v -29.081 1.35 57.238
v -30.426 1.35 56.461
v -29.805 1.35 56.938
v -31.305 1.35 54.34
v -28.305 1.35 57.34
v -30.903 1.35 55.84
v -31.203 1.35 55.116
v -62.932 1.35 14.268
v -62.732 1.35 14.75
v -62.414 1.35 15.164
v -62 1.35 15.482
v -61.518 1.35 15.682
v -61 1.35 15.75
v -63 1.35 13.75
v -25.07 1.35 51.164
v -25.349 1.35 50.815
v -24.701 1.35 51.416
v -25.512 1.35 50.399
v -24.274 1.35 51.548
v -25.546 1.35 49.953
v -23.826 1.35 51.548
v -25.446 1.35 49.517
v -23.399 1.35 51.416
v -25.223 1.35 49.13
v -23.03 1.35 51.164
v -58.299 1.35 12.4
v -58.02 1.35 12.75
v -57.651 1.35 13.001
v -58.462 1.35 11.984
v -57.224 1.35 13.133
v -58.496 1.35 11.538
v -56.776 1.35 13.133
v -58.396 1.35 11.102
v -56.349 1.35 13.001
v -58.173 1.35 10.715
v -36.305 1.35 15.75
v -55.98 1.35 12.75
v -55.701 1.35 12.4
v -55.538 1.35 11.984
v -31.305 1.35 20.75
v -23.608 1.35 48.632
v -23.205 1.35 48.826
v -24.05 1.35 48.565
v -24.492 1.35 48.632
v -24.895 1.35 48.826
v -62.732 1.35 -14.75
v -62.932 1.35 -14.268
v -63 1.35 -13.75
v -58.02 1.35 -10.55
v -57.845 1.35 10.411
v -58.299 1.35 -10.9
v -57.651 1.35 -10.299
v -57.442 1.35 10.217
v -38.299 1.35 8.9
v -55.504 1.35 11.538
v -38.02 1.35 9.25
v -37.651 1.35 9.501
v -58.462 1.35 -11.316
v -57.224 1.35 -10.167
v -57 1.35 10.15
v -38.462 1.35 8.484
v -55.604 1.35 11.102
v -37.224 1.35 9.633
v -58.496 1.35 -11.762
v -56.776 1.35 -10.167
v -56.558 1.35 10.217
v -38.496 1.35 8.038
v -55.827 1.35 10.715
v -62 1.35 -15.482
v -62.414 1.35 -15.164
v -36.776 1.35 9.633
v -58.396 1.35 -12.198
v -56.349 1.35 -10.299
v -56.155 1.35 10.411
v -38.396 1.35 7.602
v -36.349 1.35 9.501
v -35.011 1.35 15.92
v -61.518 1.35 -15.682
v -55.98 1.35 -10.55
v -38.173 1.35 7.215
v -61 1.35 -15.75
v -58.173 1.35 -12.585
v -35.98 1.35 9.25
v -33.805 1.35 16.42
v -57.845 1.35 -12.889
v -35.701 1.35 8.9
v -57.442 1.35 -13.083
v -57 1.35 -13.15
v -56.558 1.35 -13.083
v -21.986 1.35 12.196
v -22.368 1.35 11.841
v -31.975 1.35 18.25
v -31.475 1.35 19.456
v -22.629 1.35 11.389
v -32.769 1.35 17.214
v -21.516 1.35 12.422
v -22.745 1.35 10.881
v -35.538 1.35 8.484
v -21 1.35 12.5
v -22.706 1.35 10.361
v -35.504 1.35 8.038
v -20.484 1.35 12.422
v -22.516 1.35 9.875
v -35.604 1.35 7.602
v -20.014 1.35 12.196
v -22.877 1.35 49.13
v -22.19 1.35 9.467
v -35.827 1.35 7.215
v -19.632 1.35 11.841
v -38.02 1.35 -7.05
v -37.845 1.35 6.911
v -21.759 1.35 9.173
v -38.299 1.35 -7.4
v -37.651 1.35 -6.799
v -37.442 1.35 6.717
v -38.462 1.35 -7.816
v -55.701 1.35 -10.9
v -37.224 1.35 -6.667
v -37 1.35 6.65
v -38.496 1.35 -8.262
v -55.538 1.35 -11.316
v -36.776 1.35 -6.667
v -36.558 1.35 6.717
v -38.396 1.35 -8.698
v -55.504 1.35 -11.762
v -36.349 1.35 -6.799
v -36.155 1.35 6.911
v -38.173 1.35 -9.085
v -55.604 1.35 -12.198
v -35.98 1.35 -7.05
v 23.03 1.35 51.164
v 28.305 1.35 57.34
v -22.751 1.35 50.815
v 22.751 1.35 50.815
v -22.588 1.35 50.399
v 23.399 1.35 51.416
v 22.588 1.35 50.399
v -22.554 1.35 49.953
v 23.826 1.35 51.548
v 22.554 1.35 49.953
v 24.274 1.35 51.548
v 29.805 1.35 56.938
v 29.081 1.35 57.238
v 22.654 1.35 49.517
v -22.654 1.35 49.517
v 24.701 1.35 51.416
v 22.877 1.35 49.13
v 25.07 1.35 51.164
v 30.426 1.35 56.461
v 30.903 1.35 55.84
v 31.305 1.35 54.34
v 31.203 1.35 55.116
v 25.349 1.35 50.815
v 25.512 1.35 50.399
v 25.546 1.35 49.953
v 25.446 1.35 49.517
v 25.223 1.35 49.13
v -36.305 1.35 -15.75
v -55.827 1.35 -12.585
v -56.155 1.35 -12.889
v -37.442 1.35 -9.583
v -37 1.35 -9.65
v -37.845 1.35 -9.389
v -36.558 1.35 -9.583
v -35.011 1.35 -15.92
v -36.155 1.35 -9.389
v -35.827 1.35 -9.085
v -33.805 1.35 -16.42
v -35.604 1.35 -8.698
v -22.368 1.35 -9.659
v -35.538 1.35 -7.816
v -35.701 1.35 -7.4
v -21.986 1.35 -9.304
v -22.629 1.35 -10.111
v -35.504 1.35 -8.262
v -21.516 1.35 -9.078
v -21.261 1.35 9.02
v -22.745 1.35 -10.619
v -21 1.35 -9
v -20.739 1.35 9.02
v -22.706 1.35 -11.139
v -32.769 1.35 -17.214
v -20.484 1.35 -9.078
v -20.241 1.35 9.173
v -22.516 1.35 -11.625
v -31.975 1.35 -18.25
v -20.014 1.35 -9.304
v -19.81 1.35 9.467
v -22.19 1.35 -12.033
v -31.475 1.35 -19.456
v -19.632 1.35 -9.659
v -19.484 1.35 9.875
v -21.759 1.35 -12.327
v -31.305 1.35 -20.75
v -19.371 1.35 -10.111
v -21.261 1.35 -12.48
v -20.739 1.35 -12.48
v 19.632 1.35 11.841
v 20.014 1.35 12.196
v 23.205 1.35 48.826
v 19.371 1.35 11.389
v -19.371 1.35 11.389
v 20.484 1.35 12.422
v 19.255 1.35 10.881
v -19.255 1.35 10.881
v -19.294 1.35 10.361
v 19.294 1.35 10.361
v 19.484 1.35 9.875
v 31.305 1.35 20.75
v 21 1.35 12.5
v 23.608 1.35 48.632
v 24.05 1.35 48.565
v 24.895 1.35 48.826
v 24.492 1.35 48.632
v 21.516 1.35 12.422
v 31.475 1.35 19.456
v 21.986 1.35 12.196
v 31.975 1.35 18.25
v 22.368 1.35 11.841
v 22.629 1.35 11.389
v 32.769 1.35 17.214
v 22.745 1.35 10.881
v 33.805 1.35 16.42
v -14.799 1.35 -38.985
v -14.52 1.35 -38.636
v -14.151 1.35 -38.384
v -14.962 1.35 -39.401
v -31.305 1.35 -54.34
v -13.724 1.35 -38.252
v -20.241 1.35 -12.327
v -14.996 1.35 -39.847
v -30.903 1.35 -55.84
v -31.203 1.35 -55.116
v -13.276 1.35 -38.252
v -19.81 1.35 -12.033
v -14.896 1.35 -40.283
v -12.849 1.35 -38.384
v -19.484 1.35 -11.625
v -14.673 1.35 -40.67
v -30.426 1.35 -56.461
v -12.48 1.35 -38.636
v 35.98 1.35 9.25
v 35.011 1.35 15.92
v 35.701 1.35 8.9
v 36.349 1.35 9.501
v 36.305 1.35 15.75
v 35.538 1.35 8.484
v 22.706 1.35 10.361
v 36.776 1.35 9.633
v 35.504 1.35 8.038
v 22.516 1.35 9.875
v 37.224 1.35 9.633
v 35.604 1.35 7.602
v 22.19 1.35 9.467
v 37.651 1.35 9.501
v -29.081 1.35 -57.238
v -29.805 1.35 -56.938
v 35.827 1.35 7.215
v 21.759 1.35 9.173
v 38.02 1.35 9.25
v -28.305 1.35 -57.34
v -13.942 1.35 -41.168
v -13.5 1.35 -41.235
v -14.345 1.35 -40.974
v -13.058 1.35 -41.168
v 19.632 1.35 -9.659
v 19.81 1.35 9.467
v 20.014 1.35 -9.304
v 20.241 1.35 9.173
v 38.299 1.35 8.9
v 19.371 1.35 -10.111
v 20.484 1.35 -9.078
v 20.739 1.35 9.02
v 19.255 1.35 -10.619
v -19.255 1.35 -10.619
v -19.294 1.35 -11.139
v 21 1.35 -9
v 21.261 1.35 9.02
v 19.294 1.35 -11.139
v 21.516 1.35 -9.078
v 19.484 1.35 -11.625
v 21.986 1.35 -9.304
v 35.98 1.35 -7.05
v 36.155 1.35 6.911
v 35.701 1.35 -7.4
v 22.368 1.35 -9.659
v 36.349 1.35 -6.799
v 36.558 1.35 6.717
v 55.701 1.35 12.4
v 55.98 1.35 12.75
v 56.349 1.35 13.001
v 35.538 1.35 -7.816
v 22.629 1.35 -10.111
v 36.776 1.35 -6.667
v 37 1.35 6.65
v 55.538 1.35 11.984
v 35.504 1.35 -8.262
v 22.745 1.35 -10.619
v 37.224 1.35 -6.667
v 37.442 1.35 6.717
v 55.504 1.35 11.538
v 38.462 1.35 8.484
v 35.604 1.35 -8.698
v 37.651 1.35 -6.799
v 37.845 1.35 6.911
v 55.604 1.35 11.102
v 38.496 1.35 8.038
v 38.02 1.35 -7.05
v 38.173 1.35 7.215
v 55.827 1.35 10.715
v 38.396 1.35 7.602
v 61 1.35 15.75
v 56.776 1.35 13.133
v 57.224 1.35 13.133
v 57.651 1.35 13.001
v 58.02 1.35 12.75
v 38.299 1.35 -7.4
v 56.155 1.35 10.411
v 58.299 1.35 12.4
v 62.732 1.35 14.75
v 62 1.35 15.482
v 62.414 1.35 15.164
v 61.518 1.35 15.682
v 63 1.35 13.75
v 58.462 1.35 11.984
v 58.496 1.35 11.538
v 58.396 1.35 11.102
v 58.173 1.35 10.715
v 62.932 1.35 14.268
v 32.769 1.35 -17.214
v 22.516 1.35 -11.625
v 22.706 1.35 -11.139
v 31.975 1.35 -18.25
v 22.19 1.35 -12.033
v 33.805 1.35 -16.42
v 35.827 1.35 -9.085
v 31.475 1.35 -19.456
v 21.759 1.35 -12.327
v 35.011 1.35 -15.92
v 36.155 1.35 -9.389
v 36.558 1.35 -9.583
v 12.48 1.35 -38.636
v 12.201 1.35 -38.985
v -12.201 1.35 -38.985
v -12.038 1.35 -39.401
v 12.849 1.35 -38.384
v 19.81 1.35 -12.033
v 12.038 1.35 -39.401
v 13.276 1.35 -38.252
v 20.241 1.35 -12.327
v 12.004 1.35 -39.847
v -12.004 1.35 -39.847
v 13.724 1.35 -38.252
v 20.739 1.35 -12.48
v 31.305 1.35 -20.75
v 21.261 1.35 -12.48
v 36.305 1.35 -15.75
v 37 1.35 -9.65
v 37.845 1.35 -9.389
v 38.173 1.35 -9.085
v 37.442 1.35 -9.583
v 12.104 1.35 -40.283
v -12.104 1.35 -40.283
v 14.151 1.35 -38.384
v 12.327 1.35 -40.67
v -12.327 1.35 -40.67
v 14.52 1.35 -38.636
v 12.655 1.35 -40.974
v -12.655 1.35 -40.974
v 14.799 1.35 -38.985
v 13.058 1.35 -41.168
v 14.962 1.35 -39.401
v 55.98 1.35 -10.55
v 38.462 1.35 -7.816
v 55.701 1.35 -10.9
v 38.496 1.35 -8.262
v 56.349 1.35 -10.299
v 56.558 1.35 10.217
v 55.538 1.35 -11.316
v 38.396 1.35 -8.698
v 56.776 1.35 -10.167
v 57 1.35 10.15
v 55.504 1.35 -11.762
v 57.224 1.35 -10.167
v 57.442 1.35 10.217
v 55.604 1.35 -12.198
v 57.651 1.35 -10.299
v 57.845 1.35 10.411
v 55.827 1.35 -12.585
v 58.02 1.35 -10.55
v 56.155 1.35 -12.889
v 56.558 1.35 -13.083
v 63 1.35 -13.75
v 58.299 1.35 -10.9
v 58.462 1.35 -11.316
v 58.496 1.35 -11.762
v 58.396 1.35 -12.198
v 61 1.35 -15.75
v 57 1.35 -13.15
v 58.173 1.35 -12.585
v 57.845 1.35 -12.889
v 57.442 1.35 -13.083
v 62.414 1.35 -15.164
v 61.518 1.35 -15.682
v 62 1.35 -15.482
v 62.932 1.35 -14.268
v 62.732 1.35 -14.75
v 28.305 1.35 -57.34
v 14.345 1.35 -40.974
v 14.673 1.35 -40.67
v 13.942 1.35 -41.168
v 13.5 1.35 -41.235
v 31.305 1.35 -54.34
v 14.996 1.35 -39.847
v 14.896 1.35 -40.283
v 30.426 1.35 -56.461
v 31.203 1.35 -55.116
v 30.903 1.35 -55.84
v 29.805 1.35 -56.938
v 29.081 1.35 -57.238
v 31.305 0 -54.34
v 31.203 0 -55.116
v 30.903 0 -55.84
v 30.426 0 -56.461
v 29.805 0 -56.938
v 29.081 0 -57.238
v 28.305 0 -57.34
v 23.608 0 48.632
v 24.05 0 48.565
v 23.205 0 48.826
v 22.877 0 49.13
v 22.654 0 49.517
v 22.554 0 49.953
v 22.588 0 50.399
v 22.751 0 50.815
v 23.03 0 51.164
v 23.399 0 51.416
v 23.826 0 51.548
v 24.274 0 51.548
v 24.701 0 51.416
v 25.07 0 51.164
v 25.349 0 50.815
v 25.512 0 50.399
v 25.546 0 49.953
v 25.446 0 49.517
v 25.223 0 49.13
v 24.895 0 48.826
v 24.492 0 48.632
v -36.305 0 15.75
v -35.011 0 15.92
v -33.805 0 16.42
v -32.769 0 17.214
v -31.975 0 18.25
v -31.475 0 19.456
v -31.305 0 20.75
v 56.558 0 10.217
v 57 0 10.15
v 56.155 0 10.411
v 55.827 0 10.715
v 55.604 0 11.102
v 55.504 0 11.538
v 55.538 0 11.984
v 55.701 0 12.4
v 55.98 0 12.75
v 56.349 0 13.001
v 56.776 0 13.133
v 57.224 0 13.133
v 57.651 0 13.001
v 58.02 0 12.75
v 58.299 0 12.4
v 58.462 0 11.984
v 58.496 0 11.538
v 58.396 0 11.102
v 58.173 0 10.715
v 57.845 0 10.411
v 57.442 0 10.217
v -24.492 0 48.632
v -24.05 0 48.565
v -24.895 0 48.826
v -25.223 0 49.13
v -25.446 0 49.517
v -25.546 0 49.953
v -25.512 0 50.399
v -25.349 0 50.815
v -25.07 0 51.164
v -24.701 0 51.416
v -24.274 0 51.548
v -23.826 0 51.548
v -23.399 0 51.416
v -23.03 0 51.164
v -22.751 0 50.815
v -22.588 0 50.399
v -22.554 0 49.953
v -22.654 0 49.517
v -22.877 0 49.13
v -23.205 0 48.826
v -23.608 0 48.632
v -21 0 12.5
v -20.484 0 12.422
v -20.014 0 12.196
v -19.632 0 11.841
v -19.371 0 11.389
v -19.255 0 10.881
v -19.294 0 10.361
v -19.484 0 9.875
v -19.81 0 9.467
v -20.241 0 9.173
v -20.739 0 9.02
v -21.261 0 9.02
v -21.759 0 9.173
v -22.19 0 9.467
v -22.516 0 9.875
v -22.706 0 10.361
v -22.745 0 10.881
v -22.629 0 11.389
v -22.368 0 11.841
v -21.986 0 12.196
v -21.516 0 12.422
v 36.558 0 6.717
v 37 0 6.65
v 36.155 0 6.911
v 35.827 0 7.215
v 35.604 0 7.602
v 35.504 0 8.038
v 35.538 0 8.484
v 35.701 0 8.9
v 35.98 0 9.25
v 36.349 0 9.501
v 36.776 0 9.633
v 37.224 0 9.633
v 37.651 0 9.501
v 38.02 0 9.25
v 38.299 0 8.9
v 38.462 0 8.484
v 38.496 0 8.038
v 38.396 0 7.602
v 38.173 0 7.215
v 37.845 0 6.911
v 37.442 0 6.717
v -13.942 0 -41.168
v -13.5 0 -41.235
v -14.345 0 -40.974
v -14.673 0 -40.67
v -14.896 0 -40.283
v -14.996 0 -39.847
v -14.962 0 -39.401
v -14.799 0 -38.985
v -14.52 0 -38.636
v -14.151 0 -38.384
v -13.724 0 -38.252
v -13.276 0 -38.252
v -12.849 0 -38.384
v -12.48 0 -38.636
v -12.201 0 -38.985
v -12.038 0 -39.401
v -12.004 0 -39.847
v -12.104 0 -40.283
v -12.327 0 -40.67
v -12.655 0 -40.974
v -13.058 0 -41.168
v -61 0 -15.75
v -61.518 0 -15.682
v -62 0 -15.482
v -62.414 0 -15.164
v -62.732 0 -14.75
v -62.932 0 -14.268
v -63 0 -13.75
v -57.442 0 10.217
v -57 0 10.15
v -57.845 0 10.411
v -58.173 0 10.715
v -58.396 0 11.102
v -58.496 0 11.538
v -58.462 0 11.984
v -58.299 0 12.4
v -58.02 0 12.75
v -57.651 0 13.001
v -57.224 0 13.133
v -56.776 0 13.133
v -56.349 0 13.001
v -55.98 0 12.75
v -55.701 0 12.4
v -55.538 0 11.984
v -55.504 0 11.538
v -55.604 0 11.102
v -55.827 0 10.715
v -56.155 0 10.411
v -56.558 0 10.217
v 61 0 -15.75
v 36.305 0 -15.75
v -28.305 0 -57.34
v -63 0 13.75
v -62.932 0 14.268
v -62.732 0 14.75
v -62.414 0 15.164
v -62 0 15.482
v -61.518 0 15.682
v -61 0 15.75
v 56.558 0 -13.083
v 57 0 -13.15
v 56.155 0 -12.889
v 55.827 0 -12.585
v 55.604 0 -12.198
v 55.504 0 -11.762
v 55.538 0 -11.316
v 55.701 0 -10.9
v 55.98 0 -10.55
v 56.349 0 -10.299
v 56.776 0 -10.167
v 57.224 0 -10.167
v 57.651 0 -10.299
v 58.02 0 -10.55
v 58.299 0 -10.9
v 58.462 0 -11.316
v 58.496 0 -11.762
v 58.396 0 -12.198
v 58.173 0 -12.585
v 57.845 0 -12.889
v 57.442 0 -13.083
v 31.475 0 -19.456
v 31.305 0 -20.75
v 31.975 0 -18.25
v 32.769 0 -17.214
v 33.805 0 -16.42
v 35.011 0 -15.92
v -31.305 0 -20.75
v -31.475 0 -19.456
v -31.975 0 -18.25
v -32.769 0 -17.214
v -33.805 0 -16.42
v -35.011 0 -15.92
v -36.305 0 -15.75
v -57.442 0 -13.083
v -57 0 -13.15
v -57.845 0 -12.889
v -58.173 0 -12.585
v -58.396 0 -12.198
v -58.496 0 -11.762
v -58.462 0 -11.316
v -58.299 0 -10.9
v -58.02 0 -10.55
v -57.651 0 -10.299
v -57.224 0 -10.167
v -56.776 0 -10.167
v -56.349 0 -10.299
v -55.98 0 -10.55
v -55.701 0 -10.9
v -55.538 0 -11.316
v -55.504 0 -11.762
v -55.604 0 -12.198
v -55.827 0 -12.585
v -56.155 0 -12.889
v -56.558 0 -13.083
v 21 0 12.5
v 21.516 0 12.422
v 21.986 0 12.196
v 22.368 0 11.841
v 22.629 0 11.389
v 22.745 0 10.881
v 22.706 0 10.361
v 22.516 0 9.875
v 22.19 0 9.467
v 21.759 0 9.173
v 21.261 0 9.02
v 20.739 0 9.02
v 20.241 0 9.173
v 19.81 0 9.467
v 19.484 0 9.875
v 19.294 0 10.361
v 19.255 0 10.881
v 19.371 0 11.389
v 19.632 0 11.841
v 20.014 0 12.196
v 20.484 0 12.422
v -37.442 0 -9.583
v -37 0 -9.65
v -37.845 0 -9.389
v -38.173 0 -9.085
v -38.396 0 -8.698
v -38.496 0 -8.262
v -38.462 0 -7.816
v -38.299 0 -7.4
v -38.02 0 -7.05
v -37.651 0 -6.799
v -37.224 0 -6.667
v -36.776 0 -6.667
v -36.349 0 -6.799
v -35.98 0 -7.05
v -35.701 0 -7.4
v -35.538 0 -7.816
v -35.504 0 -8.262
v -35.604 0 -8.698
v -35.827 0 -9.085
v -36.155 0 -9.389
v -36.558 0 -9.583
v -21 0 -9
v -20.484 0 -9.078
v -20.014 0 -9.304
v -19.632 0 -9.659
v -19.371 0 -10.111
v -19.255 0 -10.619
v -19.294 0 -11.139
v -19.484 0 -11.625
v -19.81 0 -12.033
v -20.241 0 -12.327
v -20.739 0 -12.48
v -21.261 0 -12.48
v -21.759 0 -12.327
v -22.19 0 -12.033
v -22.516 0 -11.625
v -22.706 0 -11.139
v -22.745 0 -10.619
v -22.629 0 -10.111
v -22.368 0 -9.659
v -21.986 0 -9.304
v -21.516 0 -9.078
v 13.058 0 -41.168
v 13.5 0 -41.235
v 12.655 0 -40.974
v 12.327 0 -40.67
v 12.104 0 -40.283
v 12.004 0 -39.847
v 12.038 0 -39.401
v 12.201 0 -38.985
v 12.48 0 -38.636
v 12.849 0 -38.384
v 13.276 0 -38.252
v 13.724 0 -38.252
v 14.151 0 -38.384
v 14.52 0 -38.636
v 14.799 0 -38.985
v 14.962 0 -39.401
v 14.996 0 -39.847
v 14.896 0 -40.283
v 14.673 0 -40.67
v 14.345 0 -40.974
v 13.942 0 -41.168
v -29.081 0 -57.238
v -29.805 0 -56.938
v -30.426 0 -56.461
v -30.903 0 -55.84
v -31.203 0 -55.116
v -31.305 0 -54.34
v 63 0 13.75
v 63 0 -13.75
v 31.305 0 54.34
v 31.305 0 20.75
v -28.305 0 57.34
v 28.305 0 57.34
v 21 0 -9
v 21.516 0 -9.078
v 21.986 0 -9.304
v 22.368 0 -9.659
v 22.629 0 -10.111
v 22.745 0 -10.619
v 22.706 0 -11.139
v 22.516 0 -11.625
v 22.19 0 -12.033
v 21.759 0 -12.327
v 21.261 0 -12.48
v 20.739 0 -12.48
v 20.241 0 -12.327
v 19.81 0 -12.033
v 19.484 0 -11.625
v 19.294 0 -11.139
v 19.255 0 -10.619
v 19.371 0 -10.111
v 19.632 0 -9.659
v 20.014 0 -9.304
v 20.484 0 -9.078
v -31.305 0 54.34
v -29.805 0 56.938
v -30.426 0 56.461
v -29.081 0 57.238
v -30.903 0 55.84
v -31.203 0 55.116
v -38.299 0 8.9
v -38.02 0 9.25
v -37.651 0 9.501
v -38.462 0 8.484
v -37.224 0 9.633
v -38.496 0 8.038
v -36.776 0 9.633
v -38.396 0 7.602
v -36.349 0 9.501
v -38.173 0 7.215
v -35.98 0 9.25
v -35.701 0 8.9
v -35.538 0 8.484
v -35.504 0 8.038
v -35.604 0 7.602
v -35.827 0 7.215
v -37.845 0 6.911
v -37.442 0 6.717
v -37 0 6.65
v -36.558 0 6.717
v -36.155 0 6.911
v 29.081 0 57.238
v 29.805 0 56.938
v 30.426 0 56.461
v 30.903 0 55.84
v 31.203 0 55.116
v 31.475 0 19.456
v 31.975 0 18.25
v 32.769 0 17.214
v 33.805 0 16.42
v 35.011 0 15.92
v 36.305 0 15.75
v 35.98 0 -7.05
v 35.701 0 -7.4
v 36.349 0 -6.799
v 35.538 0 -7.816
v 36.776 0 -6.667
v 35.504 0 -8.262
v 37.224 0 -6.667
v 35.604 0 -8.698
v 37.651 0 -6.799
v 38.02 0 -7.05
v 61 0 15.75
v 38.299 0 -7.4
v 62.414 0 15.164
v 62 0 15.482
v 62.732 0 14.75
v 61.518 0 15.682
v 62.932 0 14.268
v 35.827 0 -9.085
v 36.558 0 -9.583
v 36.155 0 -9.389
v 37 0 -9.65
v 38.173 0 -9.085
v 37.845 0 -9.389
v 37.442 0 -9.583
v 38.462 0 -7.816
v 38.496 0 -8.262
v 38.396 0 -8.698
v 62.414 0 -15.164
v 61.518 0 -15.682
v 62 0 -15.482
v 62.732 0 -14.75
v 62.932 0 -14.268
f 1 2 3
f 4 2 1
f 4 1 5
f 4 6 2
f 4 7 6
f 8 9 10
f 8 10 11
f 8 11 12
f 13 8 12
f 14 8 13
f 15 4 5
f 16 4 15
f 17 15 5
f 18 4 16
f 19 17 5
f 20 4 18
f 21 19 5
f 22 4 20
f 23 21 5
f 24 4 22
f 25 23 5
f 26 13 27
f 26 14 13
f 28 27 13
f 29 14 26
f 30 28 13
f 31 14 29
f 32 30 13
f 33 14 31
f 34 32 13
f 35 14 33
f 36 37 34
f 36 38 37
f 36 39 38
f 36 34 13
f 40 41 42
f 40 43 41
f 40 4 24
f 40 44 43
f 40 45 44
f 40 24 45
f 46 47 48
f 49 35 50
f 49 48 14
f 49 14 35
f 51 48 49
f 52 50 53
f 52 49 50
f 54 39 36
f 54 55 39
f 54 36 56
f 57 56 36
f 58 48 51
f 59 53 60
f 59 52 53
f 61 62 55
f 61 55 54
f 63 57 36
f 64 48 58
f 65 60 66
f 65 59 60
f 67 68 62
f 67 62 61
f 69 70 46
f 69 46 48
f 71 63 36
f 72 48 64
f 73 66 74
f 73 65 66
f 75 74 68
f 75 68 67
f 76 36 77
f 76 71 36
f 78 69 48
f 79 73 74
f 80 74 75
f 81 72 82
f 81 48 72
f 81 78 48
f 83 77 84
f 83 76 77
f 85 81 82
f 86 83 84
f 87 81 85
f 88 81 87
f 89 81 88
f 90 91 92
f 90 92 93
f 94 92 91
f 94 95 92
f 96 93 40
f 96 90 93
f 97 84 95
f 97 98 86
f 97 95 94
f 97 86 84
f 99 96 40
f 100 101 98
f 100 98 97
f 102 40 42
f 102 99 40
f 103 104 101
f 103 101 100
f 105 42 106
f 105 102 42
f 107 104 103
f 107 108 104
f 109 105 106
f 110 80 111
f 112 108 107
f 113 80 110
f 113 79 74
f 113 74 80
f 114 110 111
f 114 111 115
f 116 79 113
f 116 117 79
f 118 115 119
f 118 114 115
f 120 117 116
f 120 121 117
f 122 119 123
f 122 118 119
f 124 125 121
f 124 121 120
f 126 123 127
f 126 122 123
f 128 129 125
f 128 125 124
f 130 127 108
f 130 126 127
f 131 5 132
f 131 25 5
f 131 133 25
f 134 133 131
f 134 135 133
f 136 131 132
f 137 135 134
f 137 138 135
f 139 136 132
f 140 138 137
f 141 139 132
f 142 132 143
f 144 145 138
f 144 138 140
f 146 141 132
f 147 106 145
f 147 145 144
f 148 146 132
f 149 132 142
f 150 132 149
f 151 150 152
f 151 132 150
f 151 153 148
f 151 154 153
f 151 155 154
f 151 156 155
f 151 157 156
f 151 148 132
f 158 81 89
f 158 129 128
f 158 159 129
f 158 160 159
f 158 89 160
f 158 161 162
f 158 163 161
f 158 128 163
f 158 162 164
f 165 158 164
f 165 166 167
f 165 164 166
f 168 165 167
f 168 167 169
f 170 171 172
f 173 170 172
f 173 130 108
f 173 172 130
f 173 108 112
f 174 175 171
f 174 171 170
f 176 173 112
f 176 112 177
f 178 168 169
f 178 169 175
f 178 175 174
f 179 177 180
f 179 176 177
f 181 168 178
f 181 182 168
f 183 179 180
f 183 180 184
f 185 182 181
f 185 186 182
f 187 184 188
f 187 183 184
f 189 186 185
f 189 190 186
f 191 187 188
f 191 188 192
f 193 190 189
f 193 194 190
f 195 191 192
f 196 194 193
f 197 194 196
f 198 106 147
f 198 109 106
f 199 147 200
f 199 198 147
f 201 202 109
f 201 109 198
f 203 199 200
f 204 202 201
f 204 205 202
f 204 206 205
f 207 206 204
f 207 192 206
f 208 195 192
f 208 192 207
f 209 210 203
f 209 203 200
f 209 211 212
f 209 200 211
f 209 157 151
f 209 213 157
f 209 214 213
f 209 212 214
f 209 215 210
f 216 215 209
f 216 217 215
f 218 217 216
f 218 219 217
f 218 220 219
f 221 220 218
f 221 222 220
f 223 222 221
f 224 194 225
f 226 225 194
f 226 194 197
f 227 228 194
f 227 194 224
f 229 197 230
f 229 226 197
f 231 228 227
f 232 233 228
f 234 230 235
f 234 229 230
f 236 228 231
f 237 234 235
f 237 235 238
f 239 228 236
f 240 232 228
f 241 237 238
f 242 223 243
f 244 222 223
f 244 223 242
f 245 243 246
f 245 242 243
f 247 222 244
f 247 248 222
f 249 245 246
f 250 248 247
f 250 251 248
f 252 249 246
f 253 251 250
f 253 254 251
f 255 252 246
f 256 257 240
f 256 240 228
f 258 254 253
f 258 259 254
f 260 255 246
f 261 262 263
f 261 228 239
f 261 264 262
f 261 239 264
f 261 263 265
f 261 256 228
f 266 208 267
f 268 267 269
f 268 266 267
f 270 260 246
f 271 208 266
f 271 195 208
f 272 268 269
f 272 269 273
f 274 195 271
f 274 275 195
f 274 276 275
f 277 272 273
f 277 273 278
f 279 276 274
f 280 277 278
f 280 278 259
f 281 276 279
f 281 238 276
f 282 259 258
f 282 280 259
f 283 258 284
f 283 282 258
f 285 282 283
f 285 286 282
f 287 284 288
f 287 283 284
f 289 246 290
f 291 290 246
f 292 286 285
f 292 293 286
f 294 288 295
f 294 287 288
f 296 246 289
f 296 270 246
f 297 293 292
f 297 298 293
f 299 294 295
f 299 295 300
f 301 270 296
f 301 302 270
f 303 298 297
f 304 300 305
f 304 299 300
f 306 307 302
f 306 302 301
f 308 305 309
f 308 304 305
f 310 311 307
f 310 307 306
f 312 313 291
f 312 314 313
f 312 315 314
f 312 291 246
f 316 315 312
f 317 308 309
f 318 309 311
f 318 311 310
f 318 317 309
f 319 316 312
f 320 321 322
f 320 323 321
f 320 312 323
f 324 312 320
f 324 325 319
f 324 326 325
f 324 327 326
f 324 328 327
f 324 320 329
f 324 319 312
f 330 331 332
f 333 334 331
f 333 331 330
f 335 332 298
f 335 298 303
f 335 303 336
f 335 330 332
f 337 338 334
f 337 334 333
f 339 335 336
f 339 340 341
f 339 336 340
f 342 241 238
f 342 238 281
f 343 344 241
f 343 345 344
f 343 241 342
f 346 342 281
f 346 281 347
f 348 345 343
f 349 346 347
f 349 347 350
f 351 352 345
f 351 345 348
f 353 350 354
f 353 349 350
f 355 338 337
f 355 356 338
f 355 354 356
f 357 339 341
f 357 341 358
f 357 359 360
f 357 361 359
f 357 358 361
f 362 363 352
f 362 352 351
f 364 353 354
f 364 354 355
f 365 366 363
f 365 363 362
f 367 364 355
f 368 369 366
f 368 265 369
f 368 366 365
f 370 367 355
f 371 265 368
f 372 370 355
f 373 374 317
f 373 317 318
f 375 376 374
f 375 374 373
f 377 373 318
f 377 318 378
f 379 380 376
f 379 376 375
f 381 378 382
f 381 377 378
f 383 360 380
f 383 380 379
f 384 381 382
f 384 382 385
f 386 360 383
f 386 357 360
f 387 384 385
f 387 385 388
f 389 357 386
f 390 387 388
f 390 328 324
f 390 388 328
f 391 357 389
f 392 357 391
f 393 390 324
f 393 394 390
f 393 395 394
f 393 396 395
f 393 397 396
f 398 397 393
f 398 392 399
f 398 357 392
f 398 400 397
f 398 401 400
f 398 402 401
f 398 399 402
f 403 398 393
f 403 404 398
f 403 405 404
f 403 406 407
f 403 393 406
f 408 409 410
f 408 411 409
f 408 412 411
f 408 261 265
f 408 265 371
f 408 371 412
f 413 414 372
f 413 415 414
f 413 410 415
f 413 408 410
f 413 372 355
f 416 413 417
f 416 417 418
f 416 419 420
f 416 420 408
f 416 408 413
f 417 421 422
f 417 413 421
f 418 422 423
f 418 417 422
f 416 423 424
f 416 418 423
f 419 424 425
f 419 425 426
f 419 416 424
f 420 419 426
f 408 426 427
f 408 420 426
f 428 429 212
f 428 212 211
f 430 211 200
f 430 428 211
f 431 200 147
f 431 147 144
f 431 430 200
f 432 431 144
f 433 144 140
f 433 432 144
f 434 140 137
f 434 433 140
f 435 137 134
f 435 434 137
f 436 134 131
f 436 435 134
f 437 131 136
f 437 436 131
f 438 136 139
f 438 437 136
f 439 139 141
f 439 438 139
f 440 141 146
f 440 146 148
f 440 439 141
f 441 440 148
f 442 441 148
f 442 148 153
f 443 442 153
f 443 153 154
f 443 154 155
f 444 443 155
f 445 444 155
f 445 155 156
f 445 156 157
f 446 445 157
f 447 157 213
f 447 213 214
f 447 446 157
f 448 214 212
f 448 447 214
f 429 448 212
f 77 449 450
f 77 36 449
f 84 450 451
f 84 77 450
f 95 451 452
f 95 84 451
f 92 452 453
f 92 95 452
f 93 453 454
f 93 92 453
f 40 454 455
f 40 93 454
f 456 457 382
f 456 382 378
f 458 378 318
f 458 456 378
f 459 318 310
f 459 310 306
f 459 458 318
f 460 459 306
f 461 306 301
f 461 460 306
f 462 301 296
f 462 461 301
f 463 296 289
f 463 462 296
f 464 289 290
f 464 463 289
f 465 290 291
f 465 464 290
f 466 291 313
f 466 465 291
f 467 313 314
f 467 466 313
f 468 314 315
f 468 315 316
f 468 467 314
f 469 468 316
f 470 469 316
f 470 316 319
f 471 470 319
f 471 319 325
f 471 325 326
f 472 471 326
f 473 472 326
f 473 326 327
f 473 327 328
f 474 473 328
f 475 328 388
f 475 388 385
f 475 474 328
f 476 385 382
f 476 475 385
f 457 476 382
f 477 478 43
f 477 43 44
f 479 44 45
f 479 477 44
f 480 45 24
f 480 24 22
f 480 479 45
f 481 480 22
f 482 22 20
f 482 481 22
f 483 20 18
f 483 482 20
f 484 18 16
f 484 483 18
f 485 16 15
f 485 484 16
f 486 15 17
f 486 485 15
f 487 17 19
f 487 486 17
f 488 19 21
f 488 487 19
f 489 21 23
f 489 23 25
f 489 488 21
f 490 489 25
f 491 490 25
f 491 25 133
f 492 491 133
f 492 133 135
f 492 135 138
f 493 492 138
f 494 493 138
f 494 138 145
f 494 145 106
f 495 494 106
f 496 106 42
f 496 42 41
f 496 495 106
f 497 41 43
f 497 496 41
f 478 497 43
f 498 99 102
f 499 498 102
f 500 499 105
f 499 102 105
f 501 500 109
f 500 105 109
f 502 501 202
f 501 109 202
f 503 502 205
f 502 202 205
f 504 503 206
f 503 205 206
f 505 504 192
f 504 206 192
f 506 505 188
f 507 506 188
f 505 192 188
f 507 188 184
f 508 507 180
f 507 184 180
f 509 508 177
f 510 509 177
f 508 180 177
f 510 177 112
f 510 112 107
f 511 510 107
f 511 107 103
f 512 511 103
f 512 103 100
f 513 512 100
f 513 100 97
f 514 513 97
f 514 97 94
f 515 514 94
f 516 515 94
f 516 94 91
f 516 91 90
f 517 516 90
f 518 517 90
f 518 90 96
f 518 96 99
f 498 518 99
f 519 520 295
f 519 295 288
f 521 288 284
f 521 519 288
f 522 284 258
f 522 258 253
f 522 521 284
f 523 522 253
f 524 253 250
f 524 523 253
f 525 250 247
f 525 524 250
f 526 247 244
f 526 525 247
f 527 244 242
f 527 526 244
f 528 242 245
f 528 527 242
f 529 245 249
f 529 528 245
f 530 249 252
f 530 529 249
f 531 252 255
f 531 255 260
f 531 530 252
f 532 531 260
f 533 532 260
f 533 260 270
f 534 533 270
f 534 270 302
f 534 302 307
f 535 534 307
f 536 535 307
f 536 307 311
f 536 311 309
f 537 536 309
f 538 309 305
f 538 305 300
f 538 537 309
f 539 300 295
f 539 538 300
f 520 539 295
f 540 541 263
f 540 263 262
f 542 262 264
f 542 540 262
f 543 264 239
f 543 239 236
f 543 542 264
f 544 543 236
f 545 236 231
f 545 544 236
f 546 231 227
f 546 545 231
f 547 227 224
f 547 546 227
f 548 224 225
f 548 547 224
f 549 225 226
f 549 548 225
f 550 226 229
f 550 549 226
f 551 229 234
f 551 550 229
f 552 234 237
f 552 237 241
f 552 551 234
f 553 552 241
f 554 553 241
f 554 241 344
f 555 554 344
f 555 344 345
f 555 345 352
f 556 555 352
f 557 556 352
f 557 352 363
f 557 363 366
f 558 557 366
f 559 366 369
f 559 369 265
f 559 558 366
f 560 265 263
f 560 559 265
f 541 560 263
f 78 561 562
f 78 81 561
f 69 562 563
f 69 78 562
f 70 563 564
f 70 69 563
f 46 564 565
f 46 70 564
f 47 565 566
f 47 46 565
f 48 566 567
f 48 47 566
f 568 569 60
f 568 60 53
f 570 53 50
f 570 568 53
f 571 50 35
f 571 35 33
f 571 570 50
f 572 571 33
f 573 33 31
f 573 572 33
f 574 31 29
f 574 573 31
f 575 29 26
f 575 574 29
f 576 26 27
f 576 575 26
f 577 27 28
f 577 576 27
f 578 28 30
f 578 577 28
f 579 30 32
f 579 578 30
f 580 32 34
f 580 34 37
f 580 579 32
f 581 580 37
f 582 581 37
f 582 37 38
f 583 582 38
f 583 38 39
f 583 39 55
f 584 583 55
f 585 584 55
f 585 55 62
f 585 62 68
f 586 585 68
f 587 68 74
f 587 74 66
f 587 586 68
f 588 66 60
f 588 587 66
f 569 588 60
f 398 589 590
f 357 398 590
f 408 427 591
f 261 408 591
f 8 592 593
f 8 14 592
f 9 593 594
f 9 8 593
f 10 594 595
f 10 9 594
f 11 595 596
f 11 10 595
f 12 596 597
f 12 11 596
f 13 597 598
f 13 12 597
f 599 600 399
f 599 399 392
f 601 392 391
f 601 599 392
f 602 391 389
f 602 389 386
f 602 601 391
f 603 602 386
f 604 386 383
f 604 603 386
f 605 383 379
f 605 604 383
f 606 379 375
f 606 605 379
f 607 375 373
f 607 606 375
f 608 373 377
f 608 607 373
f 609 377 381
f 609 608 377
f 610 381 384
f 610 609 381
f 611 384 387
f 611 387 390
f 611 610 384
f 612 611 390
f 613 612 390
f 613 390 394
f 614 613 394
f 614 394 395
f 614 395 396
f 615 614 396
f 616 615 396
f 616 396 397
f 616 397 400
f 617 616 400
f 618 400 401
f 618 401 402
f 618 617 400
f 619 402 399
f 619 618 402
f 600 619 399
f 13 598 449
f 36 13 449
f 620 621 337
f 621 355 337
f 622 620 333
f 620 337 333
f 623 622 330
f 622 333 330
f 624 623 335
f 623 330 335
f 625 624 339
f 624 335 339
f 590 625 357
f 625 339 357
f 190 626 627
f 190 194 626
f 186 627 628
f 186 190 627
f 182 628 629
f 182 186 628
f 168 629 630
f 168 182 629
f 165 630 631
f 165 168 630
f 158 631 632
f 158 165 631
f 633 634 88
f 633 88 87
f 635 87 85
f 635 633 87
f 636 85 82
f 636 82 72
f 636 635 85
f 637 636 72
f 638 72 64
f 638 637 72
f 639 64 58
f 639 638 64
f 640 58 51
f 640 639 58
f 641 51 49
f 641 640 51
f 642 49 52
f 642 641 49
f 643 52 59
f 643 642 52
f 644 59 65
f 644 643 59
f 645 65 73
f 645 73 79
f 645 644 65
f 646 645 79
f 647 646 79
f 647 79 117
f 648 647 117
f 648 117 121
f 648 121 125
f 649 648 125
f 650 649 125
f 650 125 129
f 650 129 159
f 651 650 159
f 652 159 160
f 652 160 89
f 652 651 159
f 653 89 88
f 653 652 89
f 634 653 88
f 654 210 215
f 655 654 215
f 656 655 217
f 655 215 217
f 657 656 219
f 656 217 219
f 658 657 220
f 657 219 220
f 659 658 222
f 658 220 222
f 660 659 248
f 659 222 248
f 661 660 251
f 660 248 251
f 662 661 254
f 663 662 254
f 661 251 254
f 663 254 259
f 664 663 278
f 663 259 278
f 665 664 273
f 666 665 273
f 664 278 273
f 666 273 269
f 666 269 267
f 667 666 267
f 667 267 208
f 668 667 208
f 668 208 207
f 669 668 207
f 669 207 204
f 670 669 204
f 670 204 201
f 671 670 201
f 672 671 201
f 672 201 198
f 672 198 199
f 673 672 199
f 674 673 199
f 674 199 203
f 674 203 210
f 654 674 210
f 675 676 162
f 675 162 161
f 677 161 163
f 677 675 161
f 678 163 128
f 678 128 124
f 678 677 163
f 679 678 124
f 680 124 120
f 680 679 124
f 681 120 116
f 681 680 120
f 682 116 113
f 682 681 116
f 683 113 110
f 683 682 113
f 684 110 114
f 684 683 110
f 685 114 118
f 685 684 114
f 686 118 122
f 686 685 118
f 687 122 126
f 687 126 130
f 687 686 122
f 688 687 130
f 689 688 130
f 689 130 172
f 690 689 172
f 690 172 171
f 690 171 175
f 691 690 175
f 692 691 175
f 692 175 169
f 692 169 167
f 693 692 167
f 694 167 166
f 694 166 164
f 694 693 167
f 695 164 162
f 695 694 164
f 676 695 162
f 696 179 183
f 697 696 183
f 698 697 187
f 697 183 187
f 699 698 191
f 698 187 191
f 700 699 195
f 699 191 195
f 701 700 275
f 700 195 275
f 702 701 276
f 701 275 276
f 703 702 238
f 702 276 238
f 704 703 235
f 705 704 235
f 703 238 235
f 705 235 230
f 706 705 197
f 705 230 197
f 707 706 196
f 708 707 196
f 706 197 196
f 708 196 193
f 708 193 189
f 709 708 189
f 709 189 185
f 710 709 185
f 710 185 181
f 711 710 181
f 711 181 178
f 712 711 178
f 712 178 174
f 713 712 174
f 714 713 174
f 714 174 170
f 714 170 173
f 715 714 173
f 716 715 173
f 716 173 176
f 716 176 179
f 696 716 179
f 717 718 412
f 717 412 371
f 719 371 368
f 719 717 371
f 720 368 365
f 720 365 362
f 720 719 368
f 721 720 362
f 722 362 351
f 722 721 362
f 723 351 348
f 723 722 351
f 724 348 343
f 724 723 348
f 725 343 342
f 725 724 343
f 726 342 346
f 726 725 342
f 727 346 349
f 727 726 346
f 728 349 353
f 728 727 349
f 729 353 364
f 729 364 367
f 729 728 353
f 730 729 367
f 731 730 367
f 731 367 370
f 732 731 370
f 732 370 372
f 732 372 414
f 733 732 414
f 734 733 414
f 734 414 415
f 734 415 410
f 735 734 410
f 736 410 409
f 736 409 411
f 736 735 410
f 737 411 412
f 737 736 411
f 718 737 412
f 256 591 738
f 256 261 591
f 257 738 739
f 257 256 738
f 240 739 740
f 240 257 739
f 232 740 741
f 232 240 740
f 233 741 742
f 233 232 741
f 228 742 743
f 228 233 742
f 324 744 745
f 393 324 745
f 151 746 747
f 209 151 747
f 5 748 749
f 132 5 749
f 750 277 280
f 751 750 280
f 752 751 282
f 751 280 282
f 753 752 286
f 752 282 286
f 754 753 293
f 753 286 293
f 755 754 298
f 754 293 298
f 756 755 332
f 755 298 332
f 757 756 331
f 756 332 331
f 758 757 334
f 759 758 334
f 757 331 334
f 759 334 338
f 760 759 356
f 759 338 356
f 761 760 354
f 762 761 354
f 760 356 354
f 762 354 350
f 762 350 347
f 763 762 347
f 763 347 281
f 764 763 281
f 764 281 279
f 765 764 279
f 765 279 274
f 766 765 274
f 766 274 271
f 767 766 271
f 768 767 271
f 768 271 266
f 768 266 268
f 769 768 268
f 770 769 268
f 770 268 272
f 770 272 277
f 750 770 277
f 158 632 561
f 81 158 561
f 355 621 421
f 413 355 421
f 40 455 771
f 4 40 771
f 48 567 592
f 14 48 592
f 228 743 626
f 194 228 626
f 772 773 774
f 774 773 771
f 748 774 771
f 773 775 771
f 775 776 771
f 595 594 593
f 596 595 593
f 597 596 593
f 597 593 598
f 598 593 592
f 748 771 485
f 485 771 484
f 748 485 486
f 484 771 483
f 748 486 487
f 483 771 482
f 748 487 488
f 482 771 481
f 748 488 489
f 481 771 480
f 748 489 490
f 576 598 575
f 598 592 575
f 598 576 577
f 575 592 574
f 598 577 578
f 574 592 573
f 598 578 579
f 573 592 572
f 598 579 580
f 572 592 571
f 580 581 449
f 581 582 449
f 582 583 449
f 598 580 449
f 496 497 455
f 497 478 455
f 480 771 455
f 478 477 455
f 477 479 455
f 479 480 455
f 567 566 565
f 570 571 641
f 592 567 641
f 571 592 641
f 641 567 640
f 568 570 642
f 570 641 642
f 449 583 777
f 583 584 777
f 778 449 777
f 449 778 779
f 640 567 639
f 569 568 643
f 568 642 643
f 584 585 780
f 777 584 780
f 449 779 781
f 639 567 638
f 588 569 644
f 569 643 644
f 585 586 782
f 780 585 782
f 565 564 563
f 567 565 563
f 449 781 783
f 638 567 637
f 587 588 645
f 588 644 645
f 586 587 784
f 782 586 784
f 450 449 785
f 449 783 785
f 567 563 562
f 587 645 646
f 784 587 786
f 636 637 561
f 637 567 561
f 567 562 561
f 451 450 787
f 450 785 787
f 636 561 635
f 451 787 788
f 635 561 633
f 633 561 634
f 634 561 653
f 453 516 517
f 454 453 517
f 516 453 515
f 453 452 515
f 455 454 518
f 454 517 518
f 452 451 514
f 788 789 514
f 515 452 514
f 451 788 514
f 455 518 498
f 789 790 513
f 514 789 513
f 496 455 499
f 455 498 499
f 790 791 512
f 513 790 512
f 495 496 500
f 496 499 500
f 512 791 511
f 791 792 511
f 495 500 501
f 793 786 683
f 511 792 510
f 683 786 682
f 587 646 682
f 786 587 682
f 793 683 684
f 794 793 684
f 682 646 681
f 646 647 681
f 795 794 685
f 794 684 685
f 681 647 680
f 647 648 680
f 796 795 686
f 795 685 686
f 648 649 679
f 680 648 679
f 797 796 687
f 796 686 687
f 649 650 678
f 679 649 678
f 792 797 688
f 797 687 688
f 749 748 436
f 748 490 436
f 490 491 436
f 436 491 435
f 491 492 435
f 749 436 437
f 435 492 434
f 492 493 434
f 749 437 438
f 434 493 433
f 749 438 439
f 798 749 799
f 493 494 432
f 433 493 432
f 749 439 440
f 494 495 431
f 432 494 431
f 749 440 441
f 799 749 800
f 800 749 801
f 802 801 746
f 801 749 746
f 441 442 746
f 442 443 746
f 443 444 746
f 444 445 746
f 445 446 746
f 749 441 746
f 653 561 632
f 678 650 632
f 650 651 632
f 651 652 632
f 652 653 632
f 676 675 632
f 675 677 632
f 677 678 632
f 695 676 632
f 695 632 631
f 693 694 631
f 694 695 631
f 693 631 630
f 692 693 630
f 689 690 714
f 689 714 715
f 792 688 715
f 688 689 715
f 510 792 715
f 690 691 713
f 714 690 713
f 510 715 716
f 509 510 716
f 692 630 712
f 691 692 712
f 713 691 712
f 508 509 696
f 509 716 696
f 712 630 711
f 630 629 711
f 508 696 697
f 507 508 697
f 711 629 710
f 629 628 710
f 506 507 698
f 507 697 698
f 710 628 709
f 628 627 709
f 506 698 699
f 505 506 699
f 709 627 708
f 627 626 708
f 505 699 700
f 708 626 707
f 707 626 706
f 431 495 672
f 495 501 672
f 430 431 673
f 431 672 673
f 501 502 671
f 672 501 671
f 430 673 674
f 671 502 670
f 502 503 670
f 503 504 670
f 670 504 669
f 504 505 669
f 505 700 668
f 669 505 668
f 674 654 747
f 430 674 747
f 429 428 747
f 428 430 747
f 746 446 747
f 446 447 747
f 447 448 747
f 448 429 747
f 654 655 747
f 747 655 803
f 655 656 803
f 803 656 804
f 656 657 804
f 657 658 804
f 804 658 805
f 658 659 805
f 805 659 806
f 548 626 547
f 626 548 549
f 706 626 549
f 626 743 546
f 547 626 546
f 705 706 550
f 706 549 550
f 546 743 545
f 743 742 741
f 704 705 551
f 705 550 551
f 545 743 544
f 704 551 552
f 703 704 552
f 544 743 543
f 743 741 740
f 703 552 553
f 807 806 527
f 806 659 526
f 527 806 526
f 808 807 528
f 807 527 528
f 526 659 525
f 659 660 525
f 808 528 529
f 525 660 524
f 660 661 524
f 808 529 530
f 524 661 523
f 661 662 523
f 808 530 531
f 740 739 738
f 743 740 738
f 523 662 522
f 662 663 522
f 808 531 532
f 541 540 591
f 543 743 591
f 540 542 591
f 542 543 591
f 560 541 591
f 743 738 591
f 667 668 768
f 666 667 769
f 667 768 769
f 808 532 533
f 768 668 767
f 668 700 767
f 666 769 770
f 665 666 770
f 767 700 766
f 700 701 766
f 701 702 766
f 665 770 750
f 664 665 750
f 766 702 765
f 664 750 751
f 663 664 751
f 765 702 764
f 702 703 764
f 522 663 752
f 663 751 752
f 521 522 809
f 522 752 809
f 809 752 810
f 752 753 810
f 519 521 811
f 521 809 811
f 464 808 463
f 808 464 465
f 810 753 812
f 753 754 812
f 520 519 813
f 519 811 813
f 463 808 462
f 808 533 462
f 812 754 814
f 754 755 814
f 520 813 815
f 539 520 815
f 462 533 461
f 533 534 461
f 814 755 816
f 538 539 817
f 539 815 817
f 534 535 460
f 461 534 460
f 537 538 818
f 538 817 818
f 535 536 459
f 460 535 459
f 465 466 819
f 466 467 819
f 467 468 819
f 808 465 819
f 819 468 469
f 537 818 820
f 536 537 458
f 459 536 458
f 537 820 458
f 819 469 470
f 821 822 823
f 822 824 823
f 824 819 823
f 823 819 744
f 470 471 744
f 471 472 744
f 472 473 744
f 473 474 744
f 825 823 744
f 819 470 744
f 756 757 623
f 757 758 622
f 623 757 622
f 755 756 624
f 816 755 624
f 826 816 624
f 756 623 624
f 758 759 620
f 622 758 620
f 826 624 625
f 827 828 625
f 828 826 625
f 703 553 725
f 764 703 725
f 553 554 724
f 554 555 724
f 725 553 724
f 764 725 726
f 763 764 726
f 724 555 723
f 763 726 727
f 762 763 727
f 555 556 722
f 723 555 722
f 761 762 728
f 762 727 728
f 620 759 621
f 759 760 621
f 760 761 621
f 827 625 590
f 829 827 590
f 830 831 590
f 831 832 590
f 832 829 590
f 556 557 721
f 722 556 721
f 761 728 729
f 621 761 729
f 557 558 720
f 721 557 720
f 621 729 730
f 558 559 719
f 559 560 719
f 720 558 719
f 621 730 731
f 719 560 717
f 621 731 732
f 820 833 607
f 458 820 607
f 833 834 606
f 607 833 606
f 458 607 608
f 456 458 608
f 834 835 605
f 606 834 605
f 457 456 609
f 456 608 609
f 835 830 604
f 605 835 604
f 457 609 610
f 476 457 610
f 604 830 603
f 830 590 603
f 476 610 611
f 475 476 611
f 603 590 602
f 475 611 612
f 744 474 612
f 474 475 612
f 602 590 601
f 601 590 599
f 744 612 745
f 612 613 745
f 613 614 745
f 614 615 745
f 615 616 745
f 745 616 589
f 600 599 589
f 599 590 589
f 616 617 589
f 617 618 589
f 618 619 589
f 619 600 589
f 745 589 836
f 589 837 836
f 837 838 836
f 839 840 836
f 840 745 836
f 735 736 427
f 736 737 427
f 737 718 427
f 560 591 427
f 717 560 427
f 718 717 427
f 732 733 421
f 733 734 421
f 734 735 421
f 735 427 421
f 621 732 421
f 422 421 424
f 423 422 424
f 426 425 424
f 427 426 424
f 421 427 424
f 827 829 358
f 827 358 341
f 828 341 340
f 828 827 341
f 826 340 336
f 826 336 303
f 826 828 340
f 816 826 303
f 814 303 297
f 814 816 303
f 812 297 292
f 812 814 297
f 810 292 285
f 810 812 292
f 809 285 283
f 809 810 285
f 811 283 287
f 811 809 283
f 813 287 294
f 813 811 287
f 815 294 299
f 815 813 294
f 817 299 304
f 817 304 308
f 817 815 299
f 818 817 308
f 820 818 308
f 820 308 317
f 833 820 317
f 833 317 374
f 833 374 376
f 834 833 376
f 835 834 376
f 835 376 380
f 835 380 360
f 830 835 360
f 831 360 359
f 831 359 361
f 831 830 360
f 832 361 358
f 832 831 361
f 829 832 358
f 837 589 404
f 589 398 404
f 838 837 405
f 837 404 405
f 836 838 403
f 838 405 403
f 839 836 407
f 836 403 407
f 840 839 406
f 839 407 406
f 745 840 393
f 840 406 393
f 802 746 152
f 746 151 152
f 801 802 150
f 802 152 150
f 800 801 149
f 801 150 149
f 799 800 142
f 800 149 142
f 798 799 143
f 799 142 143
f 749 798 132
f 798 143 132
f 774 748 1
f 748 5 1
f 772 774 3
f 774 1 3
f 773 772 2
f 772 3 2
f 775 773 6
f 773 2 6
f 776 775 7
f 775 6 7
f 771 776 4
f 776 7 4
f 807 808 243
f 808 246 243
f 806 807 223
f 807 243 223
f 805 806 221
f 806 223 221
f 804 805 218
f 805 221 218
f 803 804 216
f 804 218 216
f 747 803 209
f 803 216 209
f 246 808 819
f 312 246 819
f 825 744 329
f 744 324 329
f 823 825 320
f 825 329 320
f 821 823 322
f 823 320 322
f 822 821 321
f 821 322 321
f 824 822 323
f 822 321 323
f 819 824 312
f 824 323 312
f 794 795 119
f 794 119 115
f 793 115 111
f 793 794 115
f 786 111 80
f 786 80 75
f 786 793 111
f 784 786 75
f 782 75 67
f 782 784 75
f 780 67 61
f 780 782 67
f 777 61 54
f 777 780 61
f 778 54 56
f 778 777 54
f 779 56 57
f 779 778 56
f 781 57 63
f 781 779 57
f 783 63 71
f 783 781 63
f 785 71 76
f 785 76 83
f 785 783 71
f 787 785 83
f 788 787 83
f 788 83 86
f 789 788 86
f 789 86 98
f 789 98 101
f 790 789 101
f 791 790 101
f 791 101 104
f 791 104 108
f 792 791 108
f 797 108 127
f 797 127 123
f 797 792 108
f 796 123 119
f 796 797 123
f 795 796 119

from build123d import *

# Parameters (mm, degrees)
SKETCH3_R           = 1.5
BOSS_EXTRUDE1_DEPTH = 1.35
FILLET1_R           = 2
FILLET2_R           = 3
FILLET3_R           = 5
SKETCH4_R           = 1.75
CUT_EXTRUDE1_DEPTH  = 86.197993521


with BuildPart() as part:
    # Sketch3 → Boss-Extrude1 (new body)
    with BuildSketch(Plane(origin=(0, 0, 0), x_dir=(1, 0, 0), z_dir=(0, 1, 0))):
        Polygon((31.305, 15.75), (31.305, 57.34), (-31.305, 57.34), (-31.305, 15.75), (-63, 15.75), (-63, -15.75), (-31.305, -15.75), (-31.305, -57.34), (31.305, -57.34), (31.305, -15.75), (63, -15.75), (63, 15.75), align=None)
        with Locations(Location((-57, 11.65, 0), (0, 0, 90))):
            Circle(SKETCH3_R, mode=Mode.SUBTRACT)
        with Locations(Location((-57, -11.65, 0), (0, 0, 90))):
            Circle(SKETCH3_R, mode=Mode.SUBTRACT)
        with Locations(Location((-37, -8.15, 0), (0, 0, 90))):
            Circle(SKETCH3_R, mode=Mode.SUBTRACT)
        with Locations(Location((-37, 8.15, 0), (0, 0, 90))):
            Circle(SKETCH3_R, mode=Mode.SUBTRACT)
        with Locations(Location((37, 8.15, 0), (0, 0, 90))):
            Circle(SKETCH3_R, mode=Mode.SUBTRACT)
        with Locations(Location((57, 11.65, 0), (0, 0, 90))):
            Circle(SKETCH3_R, mode=Mode.SUBTRACT)
        with Locations(Location((57, -11.65, 0), (0, 0, 90))):
            Circle(SKETCH3_R, mode=Mode.SUBTRACT)
        with Locations(Location((37, -8.15, 0), (0, 0, 90))):
            Circle(SKETCH3_R, mode=Mode.SUBTRACT)
        with Locations(Location((-13.5, 39.735100189, 0), (0, 0, 90))):
            Circle(SKETCH3_R, mode=Mode.SUBTRACT)
        with Locations(Location((13.5, 39.735100189, 0), (0, 0, 90))):
            Circle(SKETCH3_R, mode=Mode.SUBTRACT)
        with Locations(Location((-24.05, -50.064899811, 0), (0, 0, 90))):
            Circle(SKETCH3_R, mode=Mode.SUBTRACT)
        with Locations(Location((24.05, -50.064899811, 0), (0, 0, 90))):
            Circle(SKETCH3_R, mode=Mode.SUBTRACT)
    extrude(amount=BOSS_EXTRUDE1_DEPTH)

    # Fillet1
    fillet1_edges = [part.edges().sort_by_distance(p)[0] for p in [
        (63, 0.675, -15.75),
        (63, 0.675, 15.75),
        (-63, 0.675, 15.75),
        (-63, 0.675, -15.75),
    ]]
    fillet(fillet1_edges, radius=FILLET1_R)

    # Fillet2
    fillet2_edges = [part.edges().sort_by_distance(p)[0] for p in [
        (-31.305, 0.675, -57.34),
        (31.305, 0.675, -57.34),
        (31.305, 0.675, 57.34),
        (-31.305, 0.675, 57.34),
    ]]
    fillet(fillet2_edges, radius=FILLET2_R)

    # Fillet3
    fillet3_edges = [part.edges().sort_by_distance(p)[0] for p in [
        (-31.305, 0.675, -15.75),
        (31.305, 0.675, -15.75),
        (31.305, 0.675, 15.75),
        (-31.305, 0.675, 15.75),
    ]]
    fillet(fillet3_edges, radius=FILLET3_R)

    # Sketch4 → Cut-Extrude1 (cut, through all)
    with BuildSketch(Plane(origin=(0, 1.35, 0), x_dir=(1, 0, 0), z_dir=(0, 1, 0))):
        with Locations(Location((-21, -10.75, 0), (0, 0, 270))):
            Circle(SKETCH4_R)
        with Locations(Location((21, -10.75, 0), (0, 0, 270))):
            Circle(SKETCH4_R)
        with Locations(Location((21, 10.75, 0), (0, 0, 270))):
            Circle(SKETCH4_R)
        with Locations(Location((-21, 10.75, 0), (0, 0, 270))):
            Circle(SKETCH4_R)
    extrude(amount=-CUT_EXTRUDE1_DEPTH, mode=Mode.SUBTRACT)


solid = part.part
